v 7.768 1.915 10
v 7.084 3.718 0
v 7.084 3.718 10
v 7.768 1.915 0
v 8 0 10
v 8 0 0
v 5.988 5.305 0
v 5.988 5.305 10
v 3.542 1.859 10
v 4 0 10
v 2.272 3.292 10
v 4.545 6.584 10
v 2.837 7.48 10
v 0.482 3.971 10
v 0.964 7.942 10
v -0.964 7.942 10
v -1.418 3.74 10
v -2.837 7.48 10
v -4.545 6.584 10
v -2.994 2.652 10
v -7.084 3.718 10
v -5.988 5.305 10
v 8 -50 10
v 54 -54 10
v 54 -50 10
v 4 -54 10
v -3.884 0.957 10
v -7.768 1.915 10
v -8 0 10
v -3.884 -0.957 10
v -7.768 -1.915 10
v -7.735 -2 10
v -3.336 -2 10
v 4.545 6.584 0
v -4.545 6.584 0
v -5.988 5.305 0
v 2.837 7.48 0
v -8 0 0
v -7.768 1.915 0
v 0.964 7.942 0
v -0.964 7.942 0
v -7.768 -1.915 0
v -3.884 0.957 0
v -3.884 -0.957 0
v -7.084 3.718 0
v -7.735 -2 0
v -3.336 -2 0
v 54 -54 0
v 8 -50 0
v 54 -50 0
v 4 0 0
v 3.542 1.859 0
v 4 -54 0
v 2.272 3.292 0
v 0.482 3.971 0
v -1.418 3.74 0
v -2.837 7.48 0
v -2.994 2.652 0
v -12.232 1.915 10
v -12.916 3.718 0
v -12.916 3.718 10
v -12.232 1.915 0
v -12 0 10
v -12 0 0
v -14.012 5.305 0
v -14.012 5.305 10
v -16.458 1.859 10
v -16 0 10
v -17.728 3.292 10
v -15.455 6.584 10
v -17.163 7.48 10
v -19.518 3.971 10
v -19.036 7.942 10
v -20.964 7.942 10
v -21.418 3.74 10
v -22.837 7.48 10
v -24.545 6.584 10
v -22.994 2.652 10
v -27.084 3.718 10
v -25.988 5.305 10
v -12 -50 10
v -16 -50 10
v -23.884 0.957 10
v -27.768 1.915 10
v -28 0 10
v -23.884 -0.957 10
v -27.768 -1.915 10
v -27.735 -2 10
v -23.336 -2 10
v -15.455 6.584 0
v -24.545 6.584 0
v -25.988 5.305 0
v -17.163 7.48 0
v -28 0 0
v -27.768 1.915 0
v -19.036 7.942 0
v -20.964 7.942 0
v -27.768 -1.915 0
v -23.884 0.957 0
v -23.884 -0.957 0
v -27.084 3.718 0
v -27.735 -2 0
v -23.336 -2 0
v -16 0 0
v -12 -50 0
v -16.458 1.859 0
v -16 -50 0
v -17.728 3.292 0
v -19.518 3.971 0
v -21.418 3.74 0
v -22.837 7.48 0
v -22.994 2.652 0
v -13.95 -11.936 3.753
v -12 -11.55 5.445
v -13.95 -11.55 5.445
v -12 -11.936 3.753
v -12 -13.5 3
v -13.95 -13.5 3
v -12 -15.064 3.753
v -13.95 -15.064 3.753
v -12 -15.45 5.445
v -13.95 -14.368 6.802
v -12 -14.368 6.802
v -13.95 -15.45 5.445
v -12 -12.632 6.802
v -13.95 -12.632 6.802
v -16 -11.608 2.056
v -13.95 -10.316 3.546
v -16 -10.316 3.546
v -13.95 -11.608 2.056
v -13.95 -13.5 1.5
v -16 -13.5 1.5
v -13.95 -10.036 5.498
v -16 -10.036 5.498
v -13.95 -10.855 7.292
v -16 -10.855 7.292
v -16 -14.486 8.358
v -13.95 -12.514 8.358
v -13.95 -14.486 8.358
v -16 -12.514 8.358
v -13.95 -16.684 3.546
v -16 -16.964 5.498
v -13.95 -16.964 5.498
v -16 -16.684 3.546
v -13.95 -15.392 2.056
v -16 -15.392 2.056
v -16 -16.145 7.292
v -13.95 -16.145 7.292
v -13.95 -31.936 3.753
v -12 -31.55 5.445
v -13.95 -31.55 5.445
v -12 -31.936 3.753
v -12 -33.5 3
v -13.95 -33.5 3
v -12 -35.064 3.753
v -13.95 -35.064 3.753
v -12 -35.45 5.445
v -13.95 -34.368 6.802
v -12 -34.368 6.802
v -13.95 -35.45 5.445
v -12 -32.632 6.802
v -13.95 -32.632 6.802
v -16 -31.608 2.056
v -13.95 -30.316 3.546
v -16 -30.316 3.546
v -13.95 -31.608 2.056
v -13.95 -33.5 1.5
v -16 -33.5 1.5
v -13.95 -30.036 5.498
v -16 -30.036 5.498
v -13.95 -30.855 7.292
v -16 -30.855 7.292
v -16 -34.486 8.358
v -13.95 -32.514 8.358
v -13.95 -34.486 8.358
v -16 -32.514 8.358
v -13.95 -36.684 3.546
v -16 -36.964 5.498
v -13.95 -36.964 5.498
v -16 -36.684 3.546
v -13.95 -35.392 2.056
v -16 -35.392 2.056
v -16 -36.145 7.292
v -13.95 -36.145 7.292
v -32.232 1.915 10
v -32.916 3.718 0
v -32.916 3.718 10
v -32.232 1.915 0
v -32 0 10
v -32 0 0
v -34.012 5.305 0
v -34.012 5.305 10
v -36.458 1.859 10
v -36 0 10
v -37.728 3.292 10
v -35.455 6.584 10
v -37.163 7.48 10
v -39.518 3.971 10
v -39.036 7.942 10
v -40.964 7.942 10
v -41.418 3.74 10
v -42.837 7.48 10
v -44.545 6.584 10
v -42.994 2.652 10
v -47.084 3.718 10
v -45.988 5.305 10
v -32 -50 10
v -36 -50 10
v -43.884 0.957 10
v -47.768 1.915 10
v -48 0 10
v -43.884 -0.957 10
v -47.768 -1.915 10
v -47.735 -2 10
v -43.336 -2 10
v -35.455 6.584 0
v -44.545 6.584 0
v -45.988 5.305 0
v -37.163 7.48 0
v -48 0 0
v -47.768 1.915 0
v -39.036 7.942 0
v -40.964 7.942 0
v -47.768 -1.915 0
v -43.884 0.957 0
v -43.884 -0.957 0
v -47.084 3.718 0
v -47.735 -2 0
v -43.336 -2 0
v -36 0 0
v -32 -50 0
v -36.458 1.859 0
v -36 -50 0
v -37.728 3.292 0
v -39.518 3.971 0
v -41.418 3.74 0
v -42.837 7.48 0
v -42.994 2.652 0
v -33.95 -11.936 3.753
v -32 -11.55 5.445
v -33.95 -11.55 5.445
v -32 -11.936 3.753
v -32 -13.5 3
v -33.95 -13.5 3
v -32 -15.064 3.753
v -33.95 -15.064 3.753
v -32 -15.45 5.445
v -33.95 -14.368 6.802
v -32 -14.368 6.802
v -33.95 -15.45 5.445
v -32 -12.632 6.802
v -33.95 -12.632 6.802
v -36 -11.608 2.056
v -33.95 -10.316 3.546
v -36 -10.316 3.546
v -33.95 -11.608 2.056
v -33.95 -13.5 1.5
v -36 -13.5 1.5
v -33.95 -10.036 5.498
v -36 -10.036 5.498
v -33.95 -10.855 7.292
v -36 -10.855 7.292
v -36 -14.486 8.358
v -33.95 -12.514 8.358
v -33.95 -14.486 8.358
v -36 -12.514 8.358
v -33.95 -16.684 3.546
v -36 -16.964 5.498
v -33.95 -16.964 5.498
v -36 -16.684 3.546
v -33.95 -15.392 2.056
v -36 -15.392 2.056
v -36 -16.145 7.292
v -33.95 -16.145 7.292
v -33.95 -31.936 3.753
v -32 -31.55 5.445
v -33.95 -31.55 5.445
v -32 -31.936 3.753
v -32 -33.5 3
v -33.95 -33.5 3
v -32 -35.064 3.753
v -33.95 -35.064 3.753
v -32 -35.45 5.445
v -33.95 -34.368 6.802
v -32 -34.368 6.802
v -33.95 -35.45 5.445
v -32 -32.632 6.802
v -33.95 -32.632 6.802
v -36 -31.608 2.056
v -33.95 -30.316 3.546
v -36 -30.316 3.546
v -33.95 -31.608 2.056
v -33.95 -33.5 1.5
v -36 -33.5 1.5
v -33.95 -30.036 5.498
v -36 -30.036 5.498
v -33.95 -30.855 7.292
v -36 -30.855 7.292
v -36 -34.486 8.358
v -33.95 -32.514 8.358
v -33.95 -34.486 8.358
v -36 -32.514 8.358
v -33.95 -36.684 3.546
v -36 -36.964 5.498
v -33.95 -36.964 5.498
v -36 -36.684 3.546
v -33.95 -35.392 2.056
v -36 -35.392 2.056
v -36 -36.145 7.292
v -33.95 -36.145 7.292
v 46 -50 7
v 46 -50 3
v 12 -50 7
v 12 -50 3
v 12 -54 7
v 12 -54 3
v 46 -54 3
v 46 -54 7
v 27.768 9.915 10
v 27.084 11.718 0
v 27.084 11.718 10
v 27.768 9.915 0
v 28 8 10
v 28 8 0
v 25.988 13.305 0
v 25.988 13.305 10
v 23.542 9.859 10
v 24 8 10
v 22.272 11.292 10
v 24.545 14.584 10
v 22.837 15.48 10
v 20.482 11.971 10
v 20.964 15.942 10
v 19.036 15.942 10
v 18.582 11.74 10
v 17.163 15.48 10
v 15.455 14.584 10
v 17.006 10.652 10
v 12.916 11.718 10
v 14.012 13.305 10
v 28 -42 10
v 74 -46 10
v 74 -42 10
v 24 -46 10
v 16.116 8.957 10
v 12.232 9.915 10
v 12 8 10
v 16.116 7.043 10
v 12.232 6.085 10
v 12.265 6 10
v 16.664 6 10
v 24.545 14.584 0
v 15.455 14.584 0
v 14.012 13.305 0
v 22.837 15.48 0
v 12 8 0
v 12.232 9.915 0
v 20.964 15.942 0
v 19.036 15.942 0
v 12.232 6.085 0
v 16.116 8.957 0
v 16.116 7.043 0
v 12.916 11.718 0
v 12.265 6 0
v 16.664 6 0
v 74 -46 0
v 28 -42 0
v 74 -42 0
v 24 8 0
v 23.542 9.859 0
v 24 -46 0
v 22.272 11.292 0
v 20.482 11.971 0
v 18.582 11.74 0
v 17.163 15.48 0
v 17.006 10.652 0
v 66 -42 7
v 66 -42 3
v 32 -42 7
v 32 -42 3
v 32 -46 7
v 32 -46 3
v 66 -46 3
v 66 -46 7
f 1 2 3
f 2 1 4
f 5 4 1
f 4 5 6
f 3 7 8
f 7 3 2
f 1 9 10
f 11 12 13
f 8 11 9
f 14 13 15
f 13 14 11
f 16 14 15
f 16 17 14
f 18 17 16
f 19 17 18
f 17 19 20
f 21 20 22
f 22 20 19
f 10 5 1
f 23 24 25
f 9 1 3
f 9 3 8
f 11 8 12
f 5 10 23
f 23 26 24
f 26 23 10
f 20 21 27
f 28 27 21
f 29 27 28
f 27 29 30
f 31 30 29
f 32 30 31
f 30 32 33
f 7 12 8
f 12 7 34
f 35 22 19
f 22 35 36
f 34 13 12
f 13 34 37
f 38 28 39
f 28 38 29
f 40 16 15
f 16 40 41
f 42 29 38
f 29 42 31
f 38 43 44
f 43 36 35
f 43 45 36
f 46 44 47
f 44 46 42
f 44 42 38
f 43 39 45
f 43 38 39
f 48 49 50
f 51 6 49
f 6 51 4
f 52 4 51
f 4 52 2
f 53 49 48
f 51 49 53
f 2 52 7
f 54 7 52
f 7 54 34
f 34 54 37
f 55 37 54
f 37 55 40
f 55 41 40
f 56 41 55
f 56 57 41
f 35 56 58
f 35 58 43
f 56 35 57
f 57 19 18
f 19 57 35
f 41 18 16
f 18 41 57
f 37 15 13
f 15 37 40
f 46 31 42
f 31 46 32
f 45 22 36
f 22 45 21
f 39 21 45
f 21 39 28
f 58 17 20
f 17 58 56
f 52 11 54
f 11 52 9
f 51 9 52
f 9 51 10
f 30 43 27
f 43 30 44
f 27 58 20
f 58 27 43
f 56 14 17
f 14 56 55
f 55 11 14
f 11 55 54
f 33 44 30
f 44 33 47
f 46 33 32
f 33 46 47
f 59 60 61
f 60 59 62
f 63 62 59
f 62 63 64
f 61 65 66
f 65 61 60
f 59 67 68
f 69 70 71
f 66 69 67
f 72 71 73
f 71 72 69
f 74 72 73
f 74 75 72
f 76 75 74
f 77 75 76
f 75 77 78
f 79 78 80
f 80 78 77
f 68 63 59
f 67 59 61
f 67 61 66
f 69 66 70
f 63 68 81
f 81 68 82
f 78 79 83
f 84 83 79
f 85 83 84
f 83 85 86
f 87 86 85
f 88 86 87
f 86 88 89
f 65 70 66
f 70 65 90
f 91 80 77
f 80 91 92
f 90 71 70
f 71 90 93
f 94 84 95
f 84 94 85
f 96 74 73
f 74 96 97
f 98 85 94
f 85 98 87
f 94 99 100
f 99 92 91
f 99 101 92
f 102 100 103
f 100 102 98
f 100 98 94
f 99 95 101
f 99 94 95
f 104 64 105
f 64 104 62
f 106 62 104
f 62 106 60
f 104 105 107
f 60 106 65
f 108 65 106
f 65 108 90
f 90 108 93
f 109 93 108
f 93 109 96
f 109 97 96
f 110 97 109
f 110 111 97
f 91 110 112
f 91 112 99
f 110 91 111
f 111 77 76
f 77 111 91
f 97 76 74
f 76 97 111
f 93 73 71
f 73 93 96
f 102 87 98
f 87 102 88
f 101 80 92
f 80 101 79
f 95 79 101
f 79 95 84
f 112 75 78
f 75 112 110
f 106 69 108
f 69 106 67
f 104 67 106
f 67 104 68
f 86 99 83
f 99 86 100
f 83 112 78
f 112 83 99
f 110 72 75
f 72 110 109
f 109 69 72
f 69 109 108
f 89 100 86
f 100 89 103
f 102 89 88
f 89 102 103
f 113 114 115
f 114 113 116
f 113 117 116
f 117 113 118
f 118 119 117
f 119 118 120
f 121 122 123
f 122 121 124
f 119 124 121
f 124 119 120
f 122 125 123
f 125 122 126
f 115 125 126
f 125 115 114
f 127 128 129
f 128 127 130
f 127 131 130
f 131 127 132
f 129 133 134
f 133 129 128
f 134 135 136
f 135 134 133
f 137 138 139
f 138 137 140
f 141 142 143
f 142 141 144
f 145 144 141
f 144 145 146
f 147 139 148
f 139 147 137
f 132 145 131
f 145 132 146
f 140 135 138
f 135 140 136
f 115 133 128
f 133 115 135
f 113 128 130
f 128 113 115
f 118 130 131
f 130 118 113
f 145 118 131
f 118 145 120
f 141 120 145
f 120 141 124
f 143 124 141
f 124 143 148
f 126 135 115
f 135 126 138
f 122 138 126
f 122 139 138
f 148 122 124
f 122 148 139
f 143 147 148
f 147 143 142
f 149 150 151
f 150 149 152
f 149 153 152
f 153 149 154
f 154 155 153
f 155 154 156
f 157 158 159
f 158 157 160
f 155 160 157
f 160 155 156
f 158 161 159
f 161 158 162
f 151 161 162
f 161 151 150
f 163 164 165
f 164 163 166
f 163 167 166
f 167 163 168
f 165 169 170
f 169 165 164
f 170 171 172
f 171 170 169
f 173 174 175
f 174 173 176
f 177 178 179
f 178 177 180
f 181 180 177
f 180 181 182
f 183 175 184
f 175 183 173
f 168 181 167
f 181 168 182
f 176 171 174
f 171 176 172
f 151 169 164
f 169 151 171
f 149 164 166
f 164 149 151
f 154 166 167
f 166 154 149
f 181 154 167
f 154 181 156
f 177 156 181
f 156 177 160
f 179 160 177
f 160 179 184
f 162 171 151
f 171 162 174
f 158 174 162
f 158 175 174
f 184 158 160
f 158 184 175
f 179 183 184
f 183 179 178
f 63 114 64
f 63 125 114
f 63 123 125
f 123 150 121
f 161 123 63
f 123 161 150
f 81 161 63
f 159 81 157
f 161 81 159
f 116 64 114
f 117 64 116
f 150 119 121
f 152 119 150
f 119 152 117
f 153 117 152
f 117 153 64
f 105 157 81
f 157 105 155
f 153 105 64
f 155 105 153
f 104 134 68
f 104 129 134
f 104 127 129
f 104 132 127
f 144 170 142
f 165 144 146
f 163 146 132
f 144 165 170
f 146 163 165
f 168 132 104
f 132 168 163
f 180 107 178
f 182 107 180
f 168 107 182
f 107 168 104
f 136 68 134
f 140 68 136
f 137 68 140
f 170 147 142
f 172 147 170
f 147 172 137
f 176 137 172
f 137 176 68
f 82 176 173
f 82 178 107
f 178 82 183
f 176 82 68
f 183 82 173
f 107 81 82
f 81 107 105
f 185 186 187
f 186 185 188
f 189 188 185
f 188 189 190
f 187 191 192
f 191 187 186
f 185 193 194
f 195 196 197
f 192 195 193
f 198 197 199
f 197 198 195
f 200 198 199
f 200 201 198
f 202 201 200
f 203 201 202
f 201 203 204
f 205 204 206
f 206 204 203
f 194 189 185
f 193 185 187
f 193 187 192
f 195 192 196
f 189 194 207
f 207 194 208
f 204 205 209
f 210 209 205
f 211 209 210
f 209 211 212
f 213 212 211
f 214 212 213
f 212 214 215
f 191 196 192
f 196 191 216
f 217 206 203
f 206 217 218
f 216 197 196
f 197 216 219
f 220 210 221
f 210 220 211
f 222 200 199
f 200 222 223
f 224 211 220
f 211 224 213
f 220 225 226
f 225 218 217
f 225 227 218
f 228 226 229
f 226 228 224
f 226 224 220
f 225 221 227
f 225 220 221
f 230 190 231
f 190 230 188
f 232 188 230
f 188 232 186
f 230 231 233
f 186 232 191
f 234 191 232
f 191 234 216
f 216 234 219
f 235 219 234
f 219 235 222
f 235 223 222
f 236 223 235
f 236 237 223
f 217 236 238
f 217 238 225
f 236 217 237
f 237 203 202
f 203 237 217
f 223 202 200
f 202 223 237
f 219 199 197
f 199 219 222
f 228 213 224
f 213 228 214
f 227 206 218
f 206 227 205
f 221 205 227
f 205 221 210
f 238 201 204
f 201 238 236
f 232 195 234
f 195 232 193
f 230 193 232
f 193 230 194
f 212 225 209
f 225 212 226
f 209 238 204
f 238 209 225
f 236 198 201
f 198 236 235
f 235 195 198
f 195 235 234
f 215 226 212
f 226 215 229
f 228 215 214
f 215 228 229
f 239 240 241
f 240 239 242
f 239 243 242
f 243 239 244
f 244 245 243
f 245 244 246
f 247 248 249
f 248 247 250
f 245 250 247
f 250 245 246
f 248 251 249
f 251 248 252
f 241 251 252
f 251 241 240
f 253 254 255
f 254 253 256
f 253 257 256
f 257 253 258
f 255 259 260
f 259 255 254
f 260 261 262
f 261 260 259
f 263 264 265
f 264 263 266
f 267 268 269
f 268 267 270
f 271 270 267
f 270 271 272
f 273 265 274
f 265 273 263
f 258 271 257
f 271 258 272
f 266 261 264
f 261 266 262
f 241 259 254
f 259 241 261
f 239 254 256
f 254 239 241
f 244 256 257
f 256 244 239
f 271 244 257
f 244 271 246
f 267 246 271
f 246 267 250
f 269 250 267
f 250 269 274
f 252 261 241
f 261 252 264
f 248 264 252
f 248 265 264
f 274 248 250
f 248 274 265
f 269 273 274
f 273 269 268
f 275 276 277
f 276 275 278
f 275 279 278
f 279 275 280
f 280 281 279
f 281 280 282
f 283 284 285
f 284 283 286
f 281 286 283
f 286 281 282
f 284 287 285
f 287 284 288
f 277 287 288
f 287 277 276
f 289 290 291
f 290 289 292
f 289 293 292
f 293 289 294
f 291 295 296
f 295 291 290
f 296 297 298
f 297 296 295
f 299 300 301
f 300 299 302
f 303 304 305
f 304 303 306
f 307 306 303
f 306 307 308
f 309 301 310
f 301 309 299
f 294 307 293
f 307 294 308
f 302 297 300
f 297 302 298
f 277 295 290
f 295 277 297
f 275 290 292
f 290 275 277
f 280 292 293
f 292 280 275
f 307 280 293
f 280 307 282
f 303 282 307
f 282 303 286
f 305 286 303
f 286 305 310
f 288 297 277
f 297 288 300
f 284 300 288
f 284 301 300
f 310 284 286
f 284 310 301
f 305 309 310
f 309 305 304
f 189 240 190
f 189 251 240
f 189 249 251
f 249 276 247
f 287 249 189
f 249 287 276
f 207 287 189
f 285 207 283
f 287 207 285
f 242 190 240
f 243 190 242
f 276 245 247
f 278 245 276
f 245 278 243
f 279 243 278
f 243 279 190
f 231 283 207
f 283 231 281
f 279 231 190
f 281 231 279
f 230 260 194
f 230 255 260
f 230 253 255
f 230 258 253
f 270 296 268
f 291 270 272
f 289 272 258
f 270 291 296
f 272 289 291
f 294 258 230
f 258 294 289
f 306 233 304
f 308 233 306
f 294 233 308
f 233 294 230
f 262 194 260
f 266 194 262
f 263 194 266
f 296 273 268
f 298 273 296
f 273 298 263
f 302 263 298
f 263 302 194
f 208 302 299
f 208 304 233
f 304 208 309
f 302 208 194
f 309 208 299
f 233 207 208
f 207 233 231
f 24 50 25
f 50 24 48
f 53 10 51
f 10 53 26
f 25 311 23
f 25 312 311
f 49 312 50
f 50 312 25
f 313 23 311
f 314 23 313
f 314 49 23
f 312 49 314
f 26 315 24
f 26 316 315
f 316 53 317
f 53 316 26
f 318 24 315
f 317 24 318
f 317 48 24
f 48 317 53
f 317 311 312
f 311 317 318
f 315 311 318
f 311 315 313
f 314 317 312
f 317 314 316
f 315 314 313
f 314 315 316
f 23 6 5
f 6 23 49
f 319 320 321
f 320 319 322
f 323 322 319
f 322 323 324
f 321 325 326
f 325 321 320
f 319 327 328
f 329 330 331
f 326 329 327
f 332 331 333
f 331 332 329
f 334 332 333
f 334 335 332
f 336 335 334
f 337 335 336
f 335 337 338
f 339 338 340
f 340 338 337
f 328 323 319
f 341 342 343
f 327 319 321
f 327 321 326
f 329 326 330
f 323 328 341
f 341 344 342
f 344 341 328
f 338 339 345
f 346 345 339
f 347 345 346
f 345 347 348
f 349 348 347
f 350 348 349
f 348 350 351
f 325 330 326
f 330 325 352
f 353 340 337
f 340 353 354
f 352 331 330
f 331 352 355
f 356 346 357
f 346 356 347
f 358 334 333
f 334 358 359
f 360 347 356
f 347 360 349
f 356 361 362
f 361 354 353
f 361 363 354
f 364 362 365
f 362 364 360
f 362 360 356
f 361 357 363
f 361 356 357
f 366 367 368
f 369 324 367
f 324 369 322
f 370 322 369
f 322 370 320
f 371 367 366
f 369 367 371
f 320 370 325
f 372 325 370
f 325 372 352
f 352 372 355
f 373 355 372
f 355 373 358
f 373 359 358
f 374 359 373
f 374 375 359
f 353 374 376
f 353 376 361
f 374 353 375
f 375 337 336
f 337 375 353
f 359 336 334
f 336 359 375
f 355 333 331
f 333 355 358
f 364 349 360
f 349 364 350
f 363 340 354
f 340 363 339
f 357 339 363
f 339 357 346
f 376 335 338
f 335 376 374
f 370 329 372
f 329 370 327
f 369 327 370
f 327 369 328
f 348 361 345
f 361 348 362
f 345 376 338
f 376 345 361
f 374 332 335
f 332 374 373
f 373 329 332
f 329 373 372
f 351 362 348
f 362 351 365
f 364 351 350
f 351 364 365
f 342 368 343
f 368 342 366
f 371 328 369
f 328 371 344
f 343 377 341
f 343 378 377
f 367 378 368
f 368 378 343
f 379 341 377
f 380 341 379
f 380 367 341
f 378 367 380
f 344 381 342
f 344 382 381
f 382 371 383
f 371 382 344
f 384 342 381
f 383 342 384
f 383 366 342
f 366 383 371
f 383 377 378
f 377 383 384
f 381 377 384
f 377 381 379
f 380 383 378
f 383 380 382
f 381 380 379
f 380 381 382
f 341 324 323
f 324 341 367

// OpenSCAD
// Holders for 12V 240W LED PSU mounting it to prusa i2
// Copyright (C) 2016 Miroslav Hradílek

// This program is  free software:  you can redistribute it and/or modify it
// under  the terms  of the  GNU General Public License  as published by the
// Free Software Foundation, version 3 of the License.
//
// This program  is  distributed  in the hope  that it will  be useful,  but
// WITHOUT  ANY WARRANTY;  without  even the implied  warranty of MERCHANTA-
// BILITY  or  FITNESS FOR A PARTICULAR PURPOSE.  See the GNU General Public
// License for more details.
//
// You should have received a copy of the  GNU General Public License  along
// with this program. If not, see <http://www.gnu.org/licenses/>.

// User set parameters
part_thick = 4; // Thickness of the imaginary sheet the part could be made out of.
part_height = 10; // How wide is the imaginary sheet the part could be made out of.
hook_body_height = 50; // Height of the closed end of the hook (the side alighned with the side of the PSU)
                       // Set this to the height of the PSU (shortest side)
hook_heel_lenght = 50; // Length of the heel of the hook (the side touching the bottom of the PSU)
                       // Set this to the width of the PSU ( second longest side) 
screw_distance = 20; // Distance between centers of the two screws
                     // Measure this.
rod_center_to_screw = 10; // Distance from rod center to the center of the first screw
                          // Measure from the top of PSU.

rod_dia = 8; // Diameter of the rod 
screw_dia = 4; // Diameter of the screw
screw_head_dia = 7; // Diameter of the screw_head
screw_head_sink = 2; // Depth of the pocket for the screw head

// Calculated helper parameters
outside_dia = rod_dia+2*part_thick; 

module hook() {
    difference() {
        // Hook outside cylinder
        cylinder(h=part_height, d=outside_dia, center=false);
        // Hook inside cylinder diameter equals rod diameter
        translate([0,0,-0.05])  cylinder(h=part_height+0.1, d=rod_dia, center=false);
        // Cuboid cutting the open end of the hook a bit lower so it locks around rod
        translate([-outside_dia/2,-outside_dia-2,-0.05])  cube([outside_dia/2,outside_dia,part_height+0.1],center=false);
        // Cuboid cutting the closed end of the hook
        translate([0-0.01,-outside_dia,-0.05])  cube([outside_dia/2,outside_dia,part_height+0.1],center=false);
    }
}

module screw_pocket() {
   rotate([0,90,0]) {
       cylinder(h=part_thick+0.1, d=screw_dia, center=false);
       cylinder(h=screw_head_sink+0.1, d=screw_head_dia, center=false);
   }
}

module hook_body_holes() {
    difference () {
        // Cuboid forming the closed end of the hook = the body
        translate([outside_dia/4,-hook_body_height,0])  cube([part_thick,hook_body_height,part_height],center=false);
        //  Screw pockets
        translate([outside_dia/4-0.05,0-screw_head_dia/2-rod_center_to_screw,part_height/2]) screw_pocket();
        translate([outside_dia/4-0.05,0-screw_head_dia/2-rod_center_to_screw-screw_distance,part_height/2]) screw_pocket();
    }
}

module hook_body() {
    // Cuboid forming the closed end of the hook = the body
    translate([outside_dia/4,-hook_body_height,0])  cube([part_thick,hook_body_height,part_height],center=false);
    difference() {
        // Cuboid forming the bottom of the hook = the heel
        translate([outside_dia/4,-hook_body_height-part_thick,0]) cube([hook_heel_lenght,part_thick,part_height],center=false);
        // Cuboid cutting the channel for the screw
        translate([outside_dia/4+2*part_thick,-hook_body_height-part_thick-0.05,part_height/2-screw_dia/2]) cube([hook_heel_lenght-4*part_thick,part_thick+0.1,screw_dia],center=false);
    }
}

// Hook to be mounted to the side of the psu with screws
module side_hook() {
    union() {
        hook();
        hook_body_holes();
    }
}

// Hook to be mounted from the bottom of the psu with adjustable distance
module adjust_hook() {
    union() {
        hook();
        hook_body();
    }
}


// Parts cloned and positioned for printing
translate([-outside_dia-part_thick,0,0]) side_hook();
translate([-2*outside_dia-2*part_thick,0,0]) side_hook();
adjust_hook();
translate([outside_dia+part_thick,2*part_thick,0]) adjust_hook();
